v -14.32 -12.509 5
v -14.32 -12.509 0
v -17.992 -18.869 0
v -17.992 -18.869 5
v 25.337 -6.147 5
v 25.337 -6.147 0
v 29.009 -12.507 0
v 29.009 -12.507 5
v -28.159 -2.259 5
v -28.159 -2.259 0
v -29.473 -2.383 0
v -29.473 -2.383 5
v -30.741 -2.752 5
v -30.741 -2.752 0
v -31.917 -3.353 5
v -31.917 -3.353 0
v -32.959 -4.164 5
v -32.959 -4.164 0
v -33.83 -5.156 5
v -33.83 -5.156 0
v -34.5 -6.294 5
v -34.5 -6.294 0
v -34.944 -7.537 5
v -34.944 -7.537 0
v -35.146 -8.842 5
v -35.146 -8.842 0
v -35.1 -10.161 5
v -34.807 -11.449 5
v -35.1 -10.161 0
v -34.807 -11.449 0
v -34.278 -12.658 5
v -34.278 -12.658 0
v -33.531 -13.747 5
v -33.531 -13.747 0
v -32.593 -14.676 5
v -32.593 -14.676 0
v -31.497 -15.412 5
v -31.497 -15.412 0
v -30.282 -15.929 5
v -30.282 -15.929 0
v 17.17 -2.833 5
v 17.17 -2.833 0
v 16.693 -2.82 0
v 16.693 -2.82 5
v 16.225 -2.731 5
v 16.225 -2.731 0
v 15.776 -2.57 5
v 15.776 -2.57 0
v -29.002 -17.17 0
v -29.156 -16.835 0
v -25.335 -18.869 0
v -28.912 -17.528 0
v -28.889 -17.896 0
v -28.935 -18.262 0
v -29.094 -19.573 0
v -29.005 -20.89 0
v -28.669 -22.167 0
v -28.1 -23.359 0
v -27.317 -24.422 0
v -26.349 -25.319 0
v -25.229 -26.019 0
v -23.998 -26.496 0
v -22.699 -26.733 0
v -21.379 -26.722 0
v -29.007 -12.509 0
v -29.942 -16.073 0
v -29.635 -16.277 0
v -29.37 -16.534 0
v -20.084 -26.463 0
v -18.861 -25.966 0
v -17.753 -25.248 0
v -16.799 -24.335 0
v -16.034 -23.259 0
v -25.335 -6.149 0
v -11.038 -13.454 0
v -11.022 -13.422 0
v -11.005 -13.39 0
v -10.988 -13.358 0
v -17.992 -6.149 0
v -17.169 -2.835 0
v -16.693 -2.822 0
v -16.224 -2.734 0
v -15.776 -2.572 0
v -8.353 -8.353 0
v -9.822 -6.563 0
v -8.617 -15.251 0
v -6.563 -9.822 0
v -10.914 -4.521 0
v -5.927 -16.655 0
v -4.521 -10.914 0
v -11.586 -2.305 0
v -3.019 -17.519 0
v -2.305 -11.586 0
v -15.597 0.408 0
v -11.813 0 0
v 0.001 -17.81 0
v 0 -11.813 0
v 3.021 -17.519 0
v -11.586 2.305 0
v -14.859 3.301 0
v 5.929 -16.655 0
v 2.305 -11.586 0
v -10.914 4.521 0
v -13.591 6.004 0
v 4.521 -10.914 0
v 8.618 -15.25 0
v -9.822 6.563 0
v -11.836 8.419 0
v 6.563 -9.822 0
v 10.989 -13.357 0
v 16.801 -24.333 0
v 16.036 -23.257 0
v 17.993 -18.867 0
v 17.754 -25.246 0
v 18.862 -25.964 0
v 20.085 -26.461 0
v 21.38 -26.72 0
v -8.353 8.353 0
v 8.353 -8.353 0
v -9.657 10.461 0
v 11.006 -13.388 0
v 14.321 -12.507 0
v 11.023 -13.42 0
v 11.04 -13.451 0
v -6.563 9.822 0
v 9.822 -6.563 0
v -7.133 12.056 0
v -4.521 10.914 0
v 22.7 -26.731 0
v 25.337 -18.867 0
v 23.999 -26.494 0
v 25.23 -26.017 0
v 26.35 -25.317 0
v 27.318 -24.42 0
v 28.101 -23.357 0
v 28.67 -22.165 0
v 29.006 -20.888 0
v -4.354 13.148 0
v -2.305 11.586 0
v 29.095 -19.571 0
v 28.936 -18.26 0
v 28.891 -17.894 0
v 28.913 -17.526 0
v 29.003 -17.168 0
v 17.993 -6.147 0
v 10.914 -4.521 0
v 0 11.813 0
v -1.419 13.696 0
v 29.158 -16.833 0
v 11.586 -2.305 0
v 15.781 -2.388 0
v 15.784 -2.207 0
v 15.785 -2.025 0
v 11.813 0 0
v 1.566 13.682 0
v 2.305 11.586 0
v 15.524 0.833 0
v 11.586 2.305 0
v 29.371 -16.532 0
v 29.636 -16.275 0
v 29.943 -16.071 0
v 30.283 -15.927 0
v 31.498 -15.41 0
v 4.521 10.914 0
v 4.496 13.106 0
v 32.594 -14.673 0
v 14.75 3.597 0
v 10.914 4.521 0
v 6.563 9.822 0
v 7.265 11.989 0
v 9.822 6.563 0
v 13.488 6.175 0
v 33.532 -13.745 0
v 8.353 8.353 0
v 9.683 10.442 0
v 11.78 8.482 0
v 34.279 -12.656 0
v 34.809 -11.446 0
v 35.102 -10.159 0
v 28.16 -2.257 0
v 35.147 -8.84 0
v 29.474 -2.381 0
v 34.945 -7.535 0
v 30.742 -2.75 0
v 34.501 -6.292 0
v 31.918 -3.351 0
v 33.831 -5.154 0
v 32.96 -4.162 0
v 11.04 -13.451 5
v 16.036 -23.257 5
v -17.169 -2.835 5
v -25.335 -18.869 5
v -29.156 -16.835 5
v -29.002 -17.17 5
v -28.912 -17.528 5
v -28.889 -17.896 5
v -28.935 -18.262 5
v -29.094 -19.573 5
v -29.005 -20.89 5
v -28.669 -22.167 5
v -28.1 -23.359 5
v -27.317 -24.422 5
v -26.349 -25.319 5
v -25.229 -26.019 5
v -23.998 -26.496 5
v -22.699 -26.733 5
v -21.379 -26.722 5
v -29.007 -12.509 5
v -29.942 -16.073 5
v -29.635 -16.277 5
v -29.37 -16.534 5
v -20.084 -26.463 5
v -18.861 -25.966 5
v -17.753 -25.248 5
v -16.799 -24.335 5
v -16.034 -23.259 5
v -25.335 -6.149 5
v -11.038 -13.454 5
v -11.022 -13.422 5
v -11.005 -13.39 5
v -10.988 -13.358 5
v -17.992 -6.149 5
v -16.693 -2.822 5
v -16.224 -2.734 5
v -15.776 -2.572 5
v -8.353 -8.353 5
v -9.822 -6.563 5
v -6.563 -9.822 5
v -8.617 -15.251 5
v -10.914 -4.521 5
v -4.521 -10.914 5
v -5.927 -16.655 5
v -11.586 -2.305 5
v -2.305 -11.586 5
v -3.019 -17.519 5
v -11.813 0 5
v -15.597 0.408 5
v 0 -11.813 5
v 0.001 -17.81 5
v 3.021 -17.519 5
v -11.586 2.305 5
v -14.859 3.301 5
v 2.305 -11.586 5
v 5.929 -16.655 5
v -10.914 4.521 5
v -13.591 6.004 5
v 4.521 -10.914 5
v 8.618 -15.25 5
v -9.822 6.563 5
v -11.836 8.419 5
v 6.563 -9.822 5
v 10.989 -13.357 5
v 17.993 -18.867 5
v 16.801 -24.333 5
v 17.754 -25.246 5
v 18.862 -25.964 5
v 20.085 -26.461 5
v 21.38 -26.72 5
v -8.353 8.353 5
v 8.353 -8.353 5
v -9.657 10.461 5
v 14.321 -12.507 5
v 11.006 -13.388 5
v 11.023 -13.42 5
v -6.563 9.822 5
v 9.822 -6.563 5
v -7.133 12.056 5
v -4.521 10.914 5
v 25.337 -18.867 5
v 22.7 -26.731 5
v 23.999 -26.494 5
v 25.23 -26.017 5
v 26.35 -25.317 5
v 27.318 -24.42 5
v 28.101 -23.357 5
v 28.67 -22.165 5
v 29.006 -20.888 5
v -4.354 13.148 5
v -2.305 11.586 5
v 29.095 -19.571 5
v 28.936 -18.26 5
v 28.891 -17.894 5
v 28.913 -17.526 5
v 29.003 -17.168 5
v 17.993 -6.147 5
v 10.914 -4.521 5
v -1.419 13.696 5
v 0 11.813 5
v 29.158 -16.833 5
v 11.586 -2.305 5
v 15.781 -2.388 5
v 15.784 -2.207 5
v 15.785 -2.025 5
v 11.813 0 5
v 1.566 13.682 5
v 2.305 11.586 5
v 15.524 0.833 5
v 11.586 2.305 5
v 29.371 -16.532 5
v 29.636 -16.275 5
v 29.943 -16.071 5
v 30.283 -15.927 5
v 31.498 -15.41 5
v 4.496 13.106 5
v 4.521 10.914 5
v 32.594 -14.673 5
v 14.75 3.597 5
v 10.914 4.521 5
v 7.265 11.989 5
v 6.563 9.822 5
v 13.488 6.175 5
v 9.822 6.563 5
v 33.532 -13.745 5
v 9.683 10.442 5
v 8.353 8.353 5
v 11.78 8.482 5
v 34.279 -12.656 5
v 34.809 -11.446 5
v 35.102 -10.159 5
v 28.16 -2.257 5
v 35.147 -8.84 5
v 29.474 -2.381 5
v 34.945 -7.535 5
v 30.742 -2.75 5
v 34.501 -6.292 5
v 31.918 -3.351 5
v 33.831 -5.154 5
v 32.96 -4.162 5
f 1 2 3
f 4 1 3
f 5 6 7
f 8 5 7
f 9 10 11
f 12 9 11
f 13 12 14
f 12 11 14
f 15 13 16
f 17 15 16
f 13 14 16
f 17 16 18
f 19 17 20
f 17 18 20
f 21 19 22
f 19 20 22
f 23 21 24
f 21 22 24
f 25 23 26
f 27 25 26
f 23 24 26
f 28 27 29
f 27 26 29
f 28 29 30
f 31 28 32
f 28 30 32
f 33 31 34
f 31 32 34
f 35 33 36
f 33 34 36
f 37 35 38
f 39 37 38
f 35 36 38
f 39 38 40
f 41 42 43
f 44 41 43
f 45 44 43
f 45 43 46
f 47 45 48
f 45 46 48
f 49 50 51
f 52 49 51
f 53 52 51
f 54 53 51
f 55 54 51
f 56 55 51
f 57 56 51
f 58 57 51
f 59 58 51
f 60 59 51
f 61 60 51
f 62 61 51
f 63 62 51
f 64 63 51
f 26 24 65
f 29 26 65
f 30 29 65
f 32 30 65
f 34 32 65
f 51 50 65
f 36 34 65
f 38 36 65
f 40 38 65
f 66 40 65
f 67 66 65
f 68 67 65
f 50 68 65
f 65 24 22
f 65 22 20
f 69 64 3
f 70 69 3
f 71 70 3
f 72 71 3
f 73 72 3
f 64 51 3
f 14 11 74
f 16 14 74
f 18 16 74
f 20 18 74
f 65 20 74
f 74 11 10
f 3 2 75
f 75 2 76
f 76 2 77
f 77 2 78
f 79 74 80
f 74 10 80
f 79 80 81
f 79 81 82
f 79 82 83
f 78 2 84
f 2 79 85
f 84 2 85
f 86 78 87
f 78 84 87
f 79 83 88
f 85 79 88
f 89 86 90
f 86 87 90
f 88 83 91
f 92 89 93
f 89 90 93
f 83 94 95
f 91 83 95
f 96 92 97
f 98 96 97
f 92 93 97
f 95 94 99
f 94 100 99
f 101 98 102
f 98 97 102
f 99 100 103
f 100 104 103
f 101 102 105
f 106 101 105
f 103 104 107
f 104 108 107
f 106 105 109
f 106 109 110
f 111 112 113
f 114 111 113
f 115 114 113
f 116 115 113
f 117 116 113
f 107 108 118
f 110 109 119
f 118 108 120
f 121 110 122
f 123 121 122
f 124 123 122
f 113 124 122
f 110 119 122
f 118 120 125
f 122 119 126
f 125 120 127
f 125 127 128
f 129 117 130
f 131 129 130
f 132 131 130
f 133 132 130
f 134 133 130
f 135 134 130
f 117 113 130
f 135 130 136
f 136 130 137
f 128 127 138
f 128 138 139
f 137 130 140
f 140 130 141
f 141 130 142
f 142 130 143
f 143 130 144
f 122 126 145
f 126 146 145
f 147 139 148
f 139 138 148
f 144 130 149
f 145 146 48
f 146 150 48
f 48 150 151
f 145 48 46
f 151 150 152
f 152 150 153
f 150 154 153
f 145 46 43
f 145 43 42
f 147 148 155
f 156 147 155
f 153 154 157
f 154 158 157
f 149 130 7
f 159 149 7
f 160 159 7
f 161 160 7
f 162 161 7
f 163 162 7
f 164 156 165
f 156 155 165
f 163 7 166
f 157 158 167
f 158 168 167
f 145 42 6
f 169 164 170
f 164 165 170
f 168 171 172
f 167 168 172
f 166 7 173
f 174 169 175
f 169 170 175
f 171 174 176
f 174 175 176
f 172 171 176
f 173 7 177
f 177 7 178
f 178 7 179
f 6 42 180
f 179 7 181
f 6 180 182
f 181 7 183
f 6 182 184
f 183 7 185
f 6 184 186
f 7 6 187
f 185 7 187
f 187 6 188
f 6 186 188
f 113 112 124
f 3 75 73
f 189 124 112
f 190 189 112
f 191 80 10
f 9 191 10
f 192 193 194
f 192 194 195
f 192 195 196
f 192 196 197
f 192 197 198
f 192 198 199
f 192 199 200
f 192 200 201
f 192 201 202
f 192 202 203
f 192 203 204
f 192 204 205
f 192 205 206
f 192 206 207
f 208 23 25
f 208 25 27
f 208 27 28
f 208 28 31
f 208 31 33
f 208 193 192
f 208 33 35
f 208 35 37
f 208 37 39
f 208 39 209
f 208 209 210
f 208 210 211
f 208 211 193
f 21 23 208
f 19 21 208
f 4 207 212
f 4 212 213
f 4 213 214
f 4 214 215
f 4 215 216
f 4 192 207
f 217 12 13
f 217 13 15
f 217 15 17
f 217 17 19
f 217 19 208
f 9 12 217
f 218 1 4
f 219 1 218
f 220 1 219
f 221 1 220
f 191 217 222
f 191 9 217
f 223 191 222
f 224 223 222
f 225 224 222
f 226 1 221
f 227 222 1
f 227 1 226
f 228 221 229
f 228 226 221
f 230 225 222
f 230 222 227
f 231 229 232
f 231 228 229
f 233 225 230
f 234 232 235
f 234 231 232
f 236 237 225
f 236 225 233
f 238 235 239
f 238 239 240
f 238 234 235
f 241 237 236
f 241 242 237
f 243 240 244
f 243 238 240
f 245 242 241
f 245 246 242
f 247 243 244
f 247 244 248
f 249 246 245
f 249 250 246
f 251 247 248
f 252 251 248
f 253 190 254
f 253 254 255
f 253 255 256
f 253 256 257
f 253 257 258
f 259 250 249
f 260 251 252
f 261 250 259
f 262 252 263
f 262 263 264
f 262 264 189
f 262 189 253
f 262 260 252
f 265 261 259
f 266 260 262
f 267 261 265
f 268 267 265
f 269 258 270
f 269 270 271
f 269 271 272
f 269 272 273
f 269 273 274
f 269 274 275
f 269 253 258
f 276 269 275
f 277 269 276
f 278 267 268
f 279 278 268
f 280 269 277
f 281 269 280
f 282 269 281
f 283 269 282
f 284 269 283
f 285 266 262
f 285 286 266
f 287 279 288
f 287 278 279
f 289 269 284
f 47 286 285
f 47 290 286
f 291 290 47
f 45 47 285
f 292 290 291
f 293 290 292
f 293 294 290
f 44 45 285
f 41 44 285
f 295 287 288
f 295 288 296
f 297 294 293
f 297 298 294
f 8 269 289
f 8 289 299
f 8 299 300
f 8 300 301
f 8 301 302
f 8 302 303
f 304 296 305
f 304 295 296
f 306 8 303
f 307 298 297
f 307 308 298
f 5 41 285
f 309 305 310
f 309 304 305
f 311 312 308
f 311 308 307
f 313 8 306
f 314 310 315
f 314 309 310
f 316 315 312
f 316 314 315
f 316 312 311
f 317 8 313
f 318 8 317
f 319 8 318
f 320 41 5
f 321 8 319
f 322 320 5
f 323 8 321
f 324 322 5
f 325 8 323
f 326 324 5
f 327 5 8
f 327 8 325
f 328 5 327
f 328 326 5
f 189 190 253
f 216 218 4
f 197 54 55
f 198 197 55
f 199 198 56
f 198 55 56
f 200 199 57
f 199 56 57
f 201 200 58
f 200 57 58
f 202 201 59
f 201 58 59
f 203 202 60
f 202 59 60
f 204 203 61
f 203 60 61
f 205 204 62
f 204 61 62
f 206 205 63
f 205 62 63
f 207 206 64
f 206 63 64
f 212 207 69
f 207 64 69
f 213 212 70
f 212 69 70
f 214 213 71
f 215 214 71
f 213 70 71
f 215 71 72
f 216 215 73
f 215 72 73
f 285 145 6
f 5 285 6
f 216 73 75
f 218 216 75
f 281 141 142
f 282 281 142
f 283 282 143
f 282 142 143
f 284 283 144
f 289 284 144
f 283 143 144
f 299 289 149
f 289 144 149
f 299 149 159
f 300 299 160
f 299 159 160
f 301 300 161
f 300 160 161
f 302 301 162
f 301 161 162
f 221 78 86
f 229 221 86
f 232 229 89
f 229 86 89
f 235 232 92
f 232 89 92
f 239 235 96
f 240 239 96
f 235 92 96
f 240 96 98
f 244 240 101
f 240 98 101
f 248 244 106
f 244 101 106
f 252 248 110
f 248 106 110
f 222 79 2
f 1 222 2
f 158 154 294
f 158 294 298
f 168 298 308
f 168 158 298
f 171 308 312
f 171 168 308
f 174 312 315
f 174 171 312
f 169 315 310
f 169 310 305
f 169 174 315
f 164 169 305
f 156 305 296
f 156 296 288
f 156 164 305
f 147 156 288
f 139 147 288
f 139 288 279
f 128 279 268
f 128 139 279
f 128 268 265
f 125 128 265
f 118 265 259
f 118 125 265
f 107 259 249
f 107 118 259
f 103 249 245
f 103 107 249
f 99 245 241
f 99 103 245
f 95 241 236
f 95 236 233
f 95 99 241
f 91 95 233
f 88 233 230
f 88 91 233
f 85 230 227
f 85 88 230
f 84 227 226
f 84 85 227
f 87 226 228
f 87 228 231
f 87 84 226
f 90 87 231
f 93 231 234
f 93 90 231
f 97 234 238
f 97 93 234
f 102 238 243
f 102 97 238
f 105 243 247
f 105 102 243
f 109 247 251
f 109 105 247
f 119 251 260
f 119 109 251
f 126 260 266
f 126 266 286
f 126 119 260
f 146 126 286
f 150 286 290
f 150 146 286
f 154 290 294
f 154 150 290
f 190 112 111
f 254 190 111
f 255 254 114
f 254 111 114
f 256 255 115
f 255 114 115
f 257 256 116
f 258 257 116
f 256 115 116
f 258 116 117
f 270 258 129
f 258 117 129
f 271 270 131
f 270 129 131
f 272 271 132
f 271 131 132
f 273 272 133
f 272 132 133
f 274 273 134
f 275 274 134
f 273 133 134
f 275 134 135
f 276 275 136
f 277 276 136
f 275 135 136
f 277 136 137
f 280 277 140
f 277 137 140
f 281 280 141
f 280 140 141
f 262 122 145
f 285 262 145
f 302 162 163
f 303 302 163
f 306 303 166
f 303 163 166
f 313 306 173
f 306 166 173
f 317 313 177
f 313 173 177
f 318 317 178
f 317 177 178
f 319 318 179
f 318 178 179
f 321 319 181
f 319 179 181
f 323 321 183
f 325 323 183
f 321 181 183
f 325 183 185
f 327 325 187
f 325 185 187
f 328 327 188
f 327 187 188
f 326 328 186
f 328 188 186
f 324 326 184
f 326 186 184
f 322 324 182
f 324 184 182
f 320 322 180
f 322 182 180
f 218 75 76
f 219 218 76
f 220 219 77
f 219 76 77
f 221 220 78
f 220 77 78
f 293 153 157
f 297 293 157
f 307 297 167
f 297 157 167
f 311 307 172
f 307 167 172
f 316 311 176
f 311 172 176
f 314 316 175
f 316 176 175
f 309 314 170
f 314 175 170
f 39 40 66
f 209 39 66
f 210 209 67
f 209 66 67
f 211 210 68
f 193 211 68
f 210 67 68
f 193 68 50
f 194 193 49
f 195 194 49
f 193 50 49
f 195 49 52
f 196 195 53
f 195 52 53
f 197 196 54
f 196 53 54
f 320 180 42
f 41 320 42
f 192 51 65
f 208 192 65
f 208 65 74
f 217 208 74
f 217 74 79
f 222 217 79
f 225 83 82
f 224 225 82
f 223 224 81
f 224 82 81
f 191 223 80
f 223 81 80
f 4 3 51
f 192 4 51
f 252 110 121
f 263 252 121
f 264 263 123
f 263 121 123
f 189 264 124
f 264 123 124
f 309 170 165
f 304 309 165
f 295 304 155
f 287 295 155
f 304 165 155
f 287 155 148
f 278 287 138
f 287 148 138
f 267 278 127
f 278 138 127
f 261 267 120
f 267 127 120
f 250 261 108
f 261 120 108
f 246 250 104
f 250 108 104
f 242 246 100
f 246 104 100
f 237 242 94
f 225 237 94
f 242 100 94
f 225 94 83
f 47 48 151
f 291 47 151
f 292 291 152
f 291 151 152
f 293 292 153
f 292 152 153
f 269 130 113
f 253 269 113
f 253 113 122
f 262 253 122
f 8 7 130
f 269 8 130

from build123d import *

# Parameters (mm, degrees)
F0_R     = 11.8128779822
F1_DEPTH = 5


with BuildPart() as f1:
    # F0 (on Top) → F1 (new body)
    with BuildSketch(Plane.XY):
        with BuildLine():
            ThreePointArc((-10.9877368692, -13.3584800376), (-14.4276328661, -8.4296575195), (-15.7757547816, -2.5722909453))
            ThreePointArc((-15.7757547816, -2.5722909453), (-16.4566838692, -2.7870228586), (-17.1690704864, -2.8347672253))
            Line((-17.1690704864, -2.8347672253), (-28.1587377075, -2.2588231712))
            ThreePointArc((-28.1587377075, -2.2588231712), (-35.0758085793, -8.184518487), (-30.2818924612, -15.9290715842))
            ThreePointArc((-30.2818924612, -15.9290715842), (-29.1564572976, -16.8348568451), (-28.9347418331, -18.2624049175))
            ThreePointArc((-28.9347418331, -18.2624049175), (-24.6247201691, -26.286334608), (-16.0343820545, -23.2588231712))
            Line((-16.0343820545, -23.2588231712), (-11.038330626, -13.4535201515))
            ThreePointArc((-11.038330626, -13.4535201515), (-11.0134601469, -13.4057731047), (-10.9877368692, -13.3584800376))
        make_face()
        Polygon((-29.0074426032, -12.5088231712), (-25.3354948912, -6.1488231712), (-17.9915994671, -6.1488231712), (-14.319651755, -12.5088231712), (-17.9915994671, -18.8688231712), (-25.3354948912, -18.8688231712), align=None, mode=Mode.SUBTRACT)
        with BuildLine():
            ThreePointArc((15.7758429715, -2.5697420135), (15.7828894553, -2.2975080655), (15.7852385163, -2.0251930691))
            ThreePointArc((15.7852385163, -2.0251930691), (13.4879848824, 6.1752958693), (7.264870736, 11.9889215374))
            ThreePointArc((7.264870736, 11.9889215374), (-8.4330311307, 11.3186347537), (-15.7757547816, -2.5722909453))
            ThreePointArc((-15.7757547816, -2.5722909453), (-14.4276328661, -8.4296575195), (-10.9877368692, -13.3584800376))
            ThreePointArc((-10.9877368692, -13.3584800376), (0.0010524985, -17.8104315503), (10.9892480908, -13.3570146974))
            ThreePointArc((10.9892480908, -13.3570146974), (14.4285771261, -8.4275299185), (15.7758429715, -2.5697420135))
        make_face()
        Circle(F0_R, mode=Mode.SUBTRACT)
        with BuildLine():
            ThreePointArc((17.1702555345, -2.8327146617), (16.4572773621, -2.784858795), (15.7758429715, -2.5697420135))
            ThreePointArc((15.7758429715, -2.5697420135), (14.4285771261, -8.4275299185), (10.9892480908, -13.3570146974))
            ThreePointArc((10.9892480908, -13.3570146974), (11.0148030033, -13.4040170233), (11.0395156741, -13.451467588))
            Line((11.0395156741, -13.451467588), (16.0355671026, -23.2567706076))
            ThreePointArc((16.0355671026, -23.2567706076), (24.6259052172, -26.2842820445), (28.9359268812, -18.260352354))
            ThreePointArc((28.9359268812, -18.260352354), (29.1576423457, -16.8328042815), (30.2830775093, -15.9270190207))
            ThreePointArc((30.2830775093, -15.9270190207), (35.0769936274, -8.1824659235), (28.1599227556, -2.2567706076))
            Line((28.1599227556, -2.2567706076), (17.1702555345, -2.8327146617))
        make_face()
        Polygon((25.3366799393, -18.8667706076), (17.9927845152, -18.8667706076), (14.3208368031, -12.5067706076), (17.9927845152, -6.1467706076), (25.3366799393, -6.1467706076), (29.0086276513, -12.5067706076), align=None, mode=Mode.SUBTRACT)
    extrude(amount=F1_DEPTH)


solid = f1.part
